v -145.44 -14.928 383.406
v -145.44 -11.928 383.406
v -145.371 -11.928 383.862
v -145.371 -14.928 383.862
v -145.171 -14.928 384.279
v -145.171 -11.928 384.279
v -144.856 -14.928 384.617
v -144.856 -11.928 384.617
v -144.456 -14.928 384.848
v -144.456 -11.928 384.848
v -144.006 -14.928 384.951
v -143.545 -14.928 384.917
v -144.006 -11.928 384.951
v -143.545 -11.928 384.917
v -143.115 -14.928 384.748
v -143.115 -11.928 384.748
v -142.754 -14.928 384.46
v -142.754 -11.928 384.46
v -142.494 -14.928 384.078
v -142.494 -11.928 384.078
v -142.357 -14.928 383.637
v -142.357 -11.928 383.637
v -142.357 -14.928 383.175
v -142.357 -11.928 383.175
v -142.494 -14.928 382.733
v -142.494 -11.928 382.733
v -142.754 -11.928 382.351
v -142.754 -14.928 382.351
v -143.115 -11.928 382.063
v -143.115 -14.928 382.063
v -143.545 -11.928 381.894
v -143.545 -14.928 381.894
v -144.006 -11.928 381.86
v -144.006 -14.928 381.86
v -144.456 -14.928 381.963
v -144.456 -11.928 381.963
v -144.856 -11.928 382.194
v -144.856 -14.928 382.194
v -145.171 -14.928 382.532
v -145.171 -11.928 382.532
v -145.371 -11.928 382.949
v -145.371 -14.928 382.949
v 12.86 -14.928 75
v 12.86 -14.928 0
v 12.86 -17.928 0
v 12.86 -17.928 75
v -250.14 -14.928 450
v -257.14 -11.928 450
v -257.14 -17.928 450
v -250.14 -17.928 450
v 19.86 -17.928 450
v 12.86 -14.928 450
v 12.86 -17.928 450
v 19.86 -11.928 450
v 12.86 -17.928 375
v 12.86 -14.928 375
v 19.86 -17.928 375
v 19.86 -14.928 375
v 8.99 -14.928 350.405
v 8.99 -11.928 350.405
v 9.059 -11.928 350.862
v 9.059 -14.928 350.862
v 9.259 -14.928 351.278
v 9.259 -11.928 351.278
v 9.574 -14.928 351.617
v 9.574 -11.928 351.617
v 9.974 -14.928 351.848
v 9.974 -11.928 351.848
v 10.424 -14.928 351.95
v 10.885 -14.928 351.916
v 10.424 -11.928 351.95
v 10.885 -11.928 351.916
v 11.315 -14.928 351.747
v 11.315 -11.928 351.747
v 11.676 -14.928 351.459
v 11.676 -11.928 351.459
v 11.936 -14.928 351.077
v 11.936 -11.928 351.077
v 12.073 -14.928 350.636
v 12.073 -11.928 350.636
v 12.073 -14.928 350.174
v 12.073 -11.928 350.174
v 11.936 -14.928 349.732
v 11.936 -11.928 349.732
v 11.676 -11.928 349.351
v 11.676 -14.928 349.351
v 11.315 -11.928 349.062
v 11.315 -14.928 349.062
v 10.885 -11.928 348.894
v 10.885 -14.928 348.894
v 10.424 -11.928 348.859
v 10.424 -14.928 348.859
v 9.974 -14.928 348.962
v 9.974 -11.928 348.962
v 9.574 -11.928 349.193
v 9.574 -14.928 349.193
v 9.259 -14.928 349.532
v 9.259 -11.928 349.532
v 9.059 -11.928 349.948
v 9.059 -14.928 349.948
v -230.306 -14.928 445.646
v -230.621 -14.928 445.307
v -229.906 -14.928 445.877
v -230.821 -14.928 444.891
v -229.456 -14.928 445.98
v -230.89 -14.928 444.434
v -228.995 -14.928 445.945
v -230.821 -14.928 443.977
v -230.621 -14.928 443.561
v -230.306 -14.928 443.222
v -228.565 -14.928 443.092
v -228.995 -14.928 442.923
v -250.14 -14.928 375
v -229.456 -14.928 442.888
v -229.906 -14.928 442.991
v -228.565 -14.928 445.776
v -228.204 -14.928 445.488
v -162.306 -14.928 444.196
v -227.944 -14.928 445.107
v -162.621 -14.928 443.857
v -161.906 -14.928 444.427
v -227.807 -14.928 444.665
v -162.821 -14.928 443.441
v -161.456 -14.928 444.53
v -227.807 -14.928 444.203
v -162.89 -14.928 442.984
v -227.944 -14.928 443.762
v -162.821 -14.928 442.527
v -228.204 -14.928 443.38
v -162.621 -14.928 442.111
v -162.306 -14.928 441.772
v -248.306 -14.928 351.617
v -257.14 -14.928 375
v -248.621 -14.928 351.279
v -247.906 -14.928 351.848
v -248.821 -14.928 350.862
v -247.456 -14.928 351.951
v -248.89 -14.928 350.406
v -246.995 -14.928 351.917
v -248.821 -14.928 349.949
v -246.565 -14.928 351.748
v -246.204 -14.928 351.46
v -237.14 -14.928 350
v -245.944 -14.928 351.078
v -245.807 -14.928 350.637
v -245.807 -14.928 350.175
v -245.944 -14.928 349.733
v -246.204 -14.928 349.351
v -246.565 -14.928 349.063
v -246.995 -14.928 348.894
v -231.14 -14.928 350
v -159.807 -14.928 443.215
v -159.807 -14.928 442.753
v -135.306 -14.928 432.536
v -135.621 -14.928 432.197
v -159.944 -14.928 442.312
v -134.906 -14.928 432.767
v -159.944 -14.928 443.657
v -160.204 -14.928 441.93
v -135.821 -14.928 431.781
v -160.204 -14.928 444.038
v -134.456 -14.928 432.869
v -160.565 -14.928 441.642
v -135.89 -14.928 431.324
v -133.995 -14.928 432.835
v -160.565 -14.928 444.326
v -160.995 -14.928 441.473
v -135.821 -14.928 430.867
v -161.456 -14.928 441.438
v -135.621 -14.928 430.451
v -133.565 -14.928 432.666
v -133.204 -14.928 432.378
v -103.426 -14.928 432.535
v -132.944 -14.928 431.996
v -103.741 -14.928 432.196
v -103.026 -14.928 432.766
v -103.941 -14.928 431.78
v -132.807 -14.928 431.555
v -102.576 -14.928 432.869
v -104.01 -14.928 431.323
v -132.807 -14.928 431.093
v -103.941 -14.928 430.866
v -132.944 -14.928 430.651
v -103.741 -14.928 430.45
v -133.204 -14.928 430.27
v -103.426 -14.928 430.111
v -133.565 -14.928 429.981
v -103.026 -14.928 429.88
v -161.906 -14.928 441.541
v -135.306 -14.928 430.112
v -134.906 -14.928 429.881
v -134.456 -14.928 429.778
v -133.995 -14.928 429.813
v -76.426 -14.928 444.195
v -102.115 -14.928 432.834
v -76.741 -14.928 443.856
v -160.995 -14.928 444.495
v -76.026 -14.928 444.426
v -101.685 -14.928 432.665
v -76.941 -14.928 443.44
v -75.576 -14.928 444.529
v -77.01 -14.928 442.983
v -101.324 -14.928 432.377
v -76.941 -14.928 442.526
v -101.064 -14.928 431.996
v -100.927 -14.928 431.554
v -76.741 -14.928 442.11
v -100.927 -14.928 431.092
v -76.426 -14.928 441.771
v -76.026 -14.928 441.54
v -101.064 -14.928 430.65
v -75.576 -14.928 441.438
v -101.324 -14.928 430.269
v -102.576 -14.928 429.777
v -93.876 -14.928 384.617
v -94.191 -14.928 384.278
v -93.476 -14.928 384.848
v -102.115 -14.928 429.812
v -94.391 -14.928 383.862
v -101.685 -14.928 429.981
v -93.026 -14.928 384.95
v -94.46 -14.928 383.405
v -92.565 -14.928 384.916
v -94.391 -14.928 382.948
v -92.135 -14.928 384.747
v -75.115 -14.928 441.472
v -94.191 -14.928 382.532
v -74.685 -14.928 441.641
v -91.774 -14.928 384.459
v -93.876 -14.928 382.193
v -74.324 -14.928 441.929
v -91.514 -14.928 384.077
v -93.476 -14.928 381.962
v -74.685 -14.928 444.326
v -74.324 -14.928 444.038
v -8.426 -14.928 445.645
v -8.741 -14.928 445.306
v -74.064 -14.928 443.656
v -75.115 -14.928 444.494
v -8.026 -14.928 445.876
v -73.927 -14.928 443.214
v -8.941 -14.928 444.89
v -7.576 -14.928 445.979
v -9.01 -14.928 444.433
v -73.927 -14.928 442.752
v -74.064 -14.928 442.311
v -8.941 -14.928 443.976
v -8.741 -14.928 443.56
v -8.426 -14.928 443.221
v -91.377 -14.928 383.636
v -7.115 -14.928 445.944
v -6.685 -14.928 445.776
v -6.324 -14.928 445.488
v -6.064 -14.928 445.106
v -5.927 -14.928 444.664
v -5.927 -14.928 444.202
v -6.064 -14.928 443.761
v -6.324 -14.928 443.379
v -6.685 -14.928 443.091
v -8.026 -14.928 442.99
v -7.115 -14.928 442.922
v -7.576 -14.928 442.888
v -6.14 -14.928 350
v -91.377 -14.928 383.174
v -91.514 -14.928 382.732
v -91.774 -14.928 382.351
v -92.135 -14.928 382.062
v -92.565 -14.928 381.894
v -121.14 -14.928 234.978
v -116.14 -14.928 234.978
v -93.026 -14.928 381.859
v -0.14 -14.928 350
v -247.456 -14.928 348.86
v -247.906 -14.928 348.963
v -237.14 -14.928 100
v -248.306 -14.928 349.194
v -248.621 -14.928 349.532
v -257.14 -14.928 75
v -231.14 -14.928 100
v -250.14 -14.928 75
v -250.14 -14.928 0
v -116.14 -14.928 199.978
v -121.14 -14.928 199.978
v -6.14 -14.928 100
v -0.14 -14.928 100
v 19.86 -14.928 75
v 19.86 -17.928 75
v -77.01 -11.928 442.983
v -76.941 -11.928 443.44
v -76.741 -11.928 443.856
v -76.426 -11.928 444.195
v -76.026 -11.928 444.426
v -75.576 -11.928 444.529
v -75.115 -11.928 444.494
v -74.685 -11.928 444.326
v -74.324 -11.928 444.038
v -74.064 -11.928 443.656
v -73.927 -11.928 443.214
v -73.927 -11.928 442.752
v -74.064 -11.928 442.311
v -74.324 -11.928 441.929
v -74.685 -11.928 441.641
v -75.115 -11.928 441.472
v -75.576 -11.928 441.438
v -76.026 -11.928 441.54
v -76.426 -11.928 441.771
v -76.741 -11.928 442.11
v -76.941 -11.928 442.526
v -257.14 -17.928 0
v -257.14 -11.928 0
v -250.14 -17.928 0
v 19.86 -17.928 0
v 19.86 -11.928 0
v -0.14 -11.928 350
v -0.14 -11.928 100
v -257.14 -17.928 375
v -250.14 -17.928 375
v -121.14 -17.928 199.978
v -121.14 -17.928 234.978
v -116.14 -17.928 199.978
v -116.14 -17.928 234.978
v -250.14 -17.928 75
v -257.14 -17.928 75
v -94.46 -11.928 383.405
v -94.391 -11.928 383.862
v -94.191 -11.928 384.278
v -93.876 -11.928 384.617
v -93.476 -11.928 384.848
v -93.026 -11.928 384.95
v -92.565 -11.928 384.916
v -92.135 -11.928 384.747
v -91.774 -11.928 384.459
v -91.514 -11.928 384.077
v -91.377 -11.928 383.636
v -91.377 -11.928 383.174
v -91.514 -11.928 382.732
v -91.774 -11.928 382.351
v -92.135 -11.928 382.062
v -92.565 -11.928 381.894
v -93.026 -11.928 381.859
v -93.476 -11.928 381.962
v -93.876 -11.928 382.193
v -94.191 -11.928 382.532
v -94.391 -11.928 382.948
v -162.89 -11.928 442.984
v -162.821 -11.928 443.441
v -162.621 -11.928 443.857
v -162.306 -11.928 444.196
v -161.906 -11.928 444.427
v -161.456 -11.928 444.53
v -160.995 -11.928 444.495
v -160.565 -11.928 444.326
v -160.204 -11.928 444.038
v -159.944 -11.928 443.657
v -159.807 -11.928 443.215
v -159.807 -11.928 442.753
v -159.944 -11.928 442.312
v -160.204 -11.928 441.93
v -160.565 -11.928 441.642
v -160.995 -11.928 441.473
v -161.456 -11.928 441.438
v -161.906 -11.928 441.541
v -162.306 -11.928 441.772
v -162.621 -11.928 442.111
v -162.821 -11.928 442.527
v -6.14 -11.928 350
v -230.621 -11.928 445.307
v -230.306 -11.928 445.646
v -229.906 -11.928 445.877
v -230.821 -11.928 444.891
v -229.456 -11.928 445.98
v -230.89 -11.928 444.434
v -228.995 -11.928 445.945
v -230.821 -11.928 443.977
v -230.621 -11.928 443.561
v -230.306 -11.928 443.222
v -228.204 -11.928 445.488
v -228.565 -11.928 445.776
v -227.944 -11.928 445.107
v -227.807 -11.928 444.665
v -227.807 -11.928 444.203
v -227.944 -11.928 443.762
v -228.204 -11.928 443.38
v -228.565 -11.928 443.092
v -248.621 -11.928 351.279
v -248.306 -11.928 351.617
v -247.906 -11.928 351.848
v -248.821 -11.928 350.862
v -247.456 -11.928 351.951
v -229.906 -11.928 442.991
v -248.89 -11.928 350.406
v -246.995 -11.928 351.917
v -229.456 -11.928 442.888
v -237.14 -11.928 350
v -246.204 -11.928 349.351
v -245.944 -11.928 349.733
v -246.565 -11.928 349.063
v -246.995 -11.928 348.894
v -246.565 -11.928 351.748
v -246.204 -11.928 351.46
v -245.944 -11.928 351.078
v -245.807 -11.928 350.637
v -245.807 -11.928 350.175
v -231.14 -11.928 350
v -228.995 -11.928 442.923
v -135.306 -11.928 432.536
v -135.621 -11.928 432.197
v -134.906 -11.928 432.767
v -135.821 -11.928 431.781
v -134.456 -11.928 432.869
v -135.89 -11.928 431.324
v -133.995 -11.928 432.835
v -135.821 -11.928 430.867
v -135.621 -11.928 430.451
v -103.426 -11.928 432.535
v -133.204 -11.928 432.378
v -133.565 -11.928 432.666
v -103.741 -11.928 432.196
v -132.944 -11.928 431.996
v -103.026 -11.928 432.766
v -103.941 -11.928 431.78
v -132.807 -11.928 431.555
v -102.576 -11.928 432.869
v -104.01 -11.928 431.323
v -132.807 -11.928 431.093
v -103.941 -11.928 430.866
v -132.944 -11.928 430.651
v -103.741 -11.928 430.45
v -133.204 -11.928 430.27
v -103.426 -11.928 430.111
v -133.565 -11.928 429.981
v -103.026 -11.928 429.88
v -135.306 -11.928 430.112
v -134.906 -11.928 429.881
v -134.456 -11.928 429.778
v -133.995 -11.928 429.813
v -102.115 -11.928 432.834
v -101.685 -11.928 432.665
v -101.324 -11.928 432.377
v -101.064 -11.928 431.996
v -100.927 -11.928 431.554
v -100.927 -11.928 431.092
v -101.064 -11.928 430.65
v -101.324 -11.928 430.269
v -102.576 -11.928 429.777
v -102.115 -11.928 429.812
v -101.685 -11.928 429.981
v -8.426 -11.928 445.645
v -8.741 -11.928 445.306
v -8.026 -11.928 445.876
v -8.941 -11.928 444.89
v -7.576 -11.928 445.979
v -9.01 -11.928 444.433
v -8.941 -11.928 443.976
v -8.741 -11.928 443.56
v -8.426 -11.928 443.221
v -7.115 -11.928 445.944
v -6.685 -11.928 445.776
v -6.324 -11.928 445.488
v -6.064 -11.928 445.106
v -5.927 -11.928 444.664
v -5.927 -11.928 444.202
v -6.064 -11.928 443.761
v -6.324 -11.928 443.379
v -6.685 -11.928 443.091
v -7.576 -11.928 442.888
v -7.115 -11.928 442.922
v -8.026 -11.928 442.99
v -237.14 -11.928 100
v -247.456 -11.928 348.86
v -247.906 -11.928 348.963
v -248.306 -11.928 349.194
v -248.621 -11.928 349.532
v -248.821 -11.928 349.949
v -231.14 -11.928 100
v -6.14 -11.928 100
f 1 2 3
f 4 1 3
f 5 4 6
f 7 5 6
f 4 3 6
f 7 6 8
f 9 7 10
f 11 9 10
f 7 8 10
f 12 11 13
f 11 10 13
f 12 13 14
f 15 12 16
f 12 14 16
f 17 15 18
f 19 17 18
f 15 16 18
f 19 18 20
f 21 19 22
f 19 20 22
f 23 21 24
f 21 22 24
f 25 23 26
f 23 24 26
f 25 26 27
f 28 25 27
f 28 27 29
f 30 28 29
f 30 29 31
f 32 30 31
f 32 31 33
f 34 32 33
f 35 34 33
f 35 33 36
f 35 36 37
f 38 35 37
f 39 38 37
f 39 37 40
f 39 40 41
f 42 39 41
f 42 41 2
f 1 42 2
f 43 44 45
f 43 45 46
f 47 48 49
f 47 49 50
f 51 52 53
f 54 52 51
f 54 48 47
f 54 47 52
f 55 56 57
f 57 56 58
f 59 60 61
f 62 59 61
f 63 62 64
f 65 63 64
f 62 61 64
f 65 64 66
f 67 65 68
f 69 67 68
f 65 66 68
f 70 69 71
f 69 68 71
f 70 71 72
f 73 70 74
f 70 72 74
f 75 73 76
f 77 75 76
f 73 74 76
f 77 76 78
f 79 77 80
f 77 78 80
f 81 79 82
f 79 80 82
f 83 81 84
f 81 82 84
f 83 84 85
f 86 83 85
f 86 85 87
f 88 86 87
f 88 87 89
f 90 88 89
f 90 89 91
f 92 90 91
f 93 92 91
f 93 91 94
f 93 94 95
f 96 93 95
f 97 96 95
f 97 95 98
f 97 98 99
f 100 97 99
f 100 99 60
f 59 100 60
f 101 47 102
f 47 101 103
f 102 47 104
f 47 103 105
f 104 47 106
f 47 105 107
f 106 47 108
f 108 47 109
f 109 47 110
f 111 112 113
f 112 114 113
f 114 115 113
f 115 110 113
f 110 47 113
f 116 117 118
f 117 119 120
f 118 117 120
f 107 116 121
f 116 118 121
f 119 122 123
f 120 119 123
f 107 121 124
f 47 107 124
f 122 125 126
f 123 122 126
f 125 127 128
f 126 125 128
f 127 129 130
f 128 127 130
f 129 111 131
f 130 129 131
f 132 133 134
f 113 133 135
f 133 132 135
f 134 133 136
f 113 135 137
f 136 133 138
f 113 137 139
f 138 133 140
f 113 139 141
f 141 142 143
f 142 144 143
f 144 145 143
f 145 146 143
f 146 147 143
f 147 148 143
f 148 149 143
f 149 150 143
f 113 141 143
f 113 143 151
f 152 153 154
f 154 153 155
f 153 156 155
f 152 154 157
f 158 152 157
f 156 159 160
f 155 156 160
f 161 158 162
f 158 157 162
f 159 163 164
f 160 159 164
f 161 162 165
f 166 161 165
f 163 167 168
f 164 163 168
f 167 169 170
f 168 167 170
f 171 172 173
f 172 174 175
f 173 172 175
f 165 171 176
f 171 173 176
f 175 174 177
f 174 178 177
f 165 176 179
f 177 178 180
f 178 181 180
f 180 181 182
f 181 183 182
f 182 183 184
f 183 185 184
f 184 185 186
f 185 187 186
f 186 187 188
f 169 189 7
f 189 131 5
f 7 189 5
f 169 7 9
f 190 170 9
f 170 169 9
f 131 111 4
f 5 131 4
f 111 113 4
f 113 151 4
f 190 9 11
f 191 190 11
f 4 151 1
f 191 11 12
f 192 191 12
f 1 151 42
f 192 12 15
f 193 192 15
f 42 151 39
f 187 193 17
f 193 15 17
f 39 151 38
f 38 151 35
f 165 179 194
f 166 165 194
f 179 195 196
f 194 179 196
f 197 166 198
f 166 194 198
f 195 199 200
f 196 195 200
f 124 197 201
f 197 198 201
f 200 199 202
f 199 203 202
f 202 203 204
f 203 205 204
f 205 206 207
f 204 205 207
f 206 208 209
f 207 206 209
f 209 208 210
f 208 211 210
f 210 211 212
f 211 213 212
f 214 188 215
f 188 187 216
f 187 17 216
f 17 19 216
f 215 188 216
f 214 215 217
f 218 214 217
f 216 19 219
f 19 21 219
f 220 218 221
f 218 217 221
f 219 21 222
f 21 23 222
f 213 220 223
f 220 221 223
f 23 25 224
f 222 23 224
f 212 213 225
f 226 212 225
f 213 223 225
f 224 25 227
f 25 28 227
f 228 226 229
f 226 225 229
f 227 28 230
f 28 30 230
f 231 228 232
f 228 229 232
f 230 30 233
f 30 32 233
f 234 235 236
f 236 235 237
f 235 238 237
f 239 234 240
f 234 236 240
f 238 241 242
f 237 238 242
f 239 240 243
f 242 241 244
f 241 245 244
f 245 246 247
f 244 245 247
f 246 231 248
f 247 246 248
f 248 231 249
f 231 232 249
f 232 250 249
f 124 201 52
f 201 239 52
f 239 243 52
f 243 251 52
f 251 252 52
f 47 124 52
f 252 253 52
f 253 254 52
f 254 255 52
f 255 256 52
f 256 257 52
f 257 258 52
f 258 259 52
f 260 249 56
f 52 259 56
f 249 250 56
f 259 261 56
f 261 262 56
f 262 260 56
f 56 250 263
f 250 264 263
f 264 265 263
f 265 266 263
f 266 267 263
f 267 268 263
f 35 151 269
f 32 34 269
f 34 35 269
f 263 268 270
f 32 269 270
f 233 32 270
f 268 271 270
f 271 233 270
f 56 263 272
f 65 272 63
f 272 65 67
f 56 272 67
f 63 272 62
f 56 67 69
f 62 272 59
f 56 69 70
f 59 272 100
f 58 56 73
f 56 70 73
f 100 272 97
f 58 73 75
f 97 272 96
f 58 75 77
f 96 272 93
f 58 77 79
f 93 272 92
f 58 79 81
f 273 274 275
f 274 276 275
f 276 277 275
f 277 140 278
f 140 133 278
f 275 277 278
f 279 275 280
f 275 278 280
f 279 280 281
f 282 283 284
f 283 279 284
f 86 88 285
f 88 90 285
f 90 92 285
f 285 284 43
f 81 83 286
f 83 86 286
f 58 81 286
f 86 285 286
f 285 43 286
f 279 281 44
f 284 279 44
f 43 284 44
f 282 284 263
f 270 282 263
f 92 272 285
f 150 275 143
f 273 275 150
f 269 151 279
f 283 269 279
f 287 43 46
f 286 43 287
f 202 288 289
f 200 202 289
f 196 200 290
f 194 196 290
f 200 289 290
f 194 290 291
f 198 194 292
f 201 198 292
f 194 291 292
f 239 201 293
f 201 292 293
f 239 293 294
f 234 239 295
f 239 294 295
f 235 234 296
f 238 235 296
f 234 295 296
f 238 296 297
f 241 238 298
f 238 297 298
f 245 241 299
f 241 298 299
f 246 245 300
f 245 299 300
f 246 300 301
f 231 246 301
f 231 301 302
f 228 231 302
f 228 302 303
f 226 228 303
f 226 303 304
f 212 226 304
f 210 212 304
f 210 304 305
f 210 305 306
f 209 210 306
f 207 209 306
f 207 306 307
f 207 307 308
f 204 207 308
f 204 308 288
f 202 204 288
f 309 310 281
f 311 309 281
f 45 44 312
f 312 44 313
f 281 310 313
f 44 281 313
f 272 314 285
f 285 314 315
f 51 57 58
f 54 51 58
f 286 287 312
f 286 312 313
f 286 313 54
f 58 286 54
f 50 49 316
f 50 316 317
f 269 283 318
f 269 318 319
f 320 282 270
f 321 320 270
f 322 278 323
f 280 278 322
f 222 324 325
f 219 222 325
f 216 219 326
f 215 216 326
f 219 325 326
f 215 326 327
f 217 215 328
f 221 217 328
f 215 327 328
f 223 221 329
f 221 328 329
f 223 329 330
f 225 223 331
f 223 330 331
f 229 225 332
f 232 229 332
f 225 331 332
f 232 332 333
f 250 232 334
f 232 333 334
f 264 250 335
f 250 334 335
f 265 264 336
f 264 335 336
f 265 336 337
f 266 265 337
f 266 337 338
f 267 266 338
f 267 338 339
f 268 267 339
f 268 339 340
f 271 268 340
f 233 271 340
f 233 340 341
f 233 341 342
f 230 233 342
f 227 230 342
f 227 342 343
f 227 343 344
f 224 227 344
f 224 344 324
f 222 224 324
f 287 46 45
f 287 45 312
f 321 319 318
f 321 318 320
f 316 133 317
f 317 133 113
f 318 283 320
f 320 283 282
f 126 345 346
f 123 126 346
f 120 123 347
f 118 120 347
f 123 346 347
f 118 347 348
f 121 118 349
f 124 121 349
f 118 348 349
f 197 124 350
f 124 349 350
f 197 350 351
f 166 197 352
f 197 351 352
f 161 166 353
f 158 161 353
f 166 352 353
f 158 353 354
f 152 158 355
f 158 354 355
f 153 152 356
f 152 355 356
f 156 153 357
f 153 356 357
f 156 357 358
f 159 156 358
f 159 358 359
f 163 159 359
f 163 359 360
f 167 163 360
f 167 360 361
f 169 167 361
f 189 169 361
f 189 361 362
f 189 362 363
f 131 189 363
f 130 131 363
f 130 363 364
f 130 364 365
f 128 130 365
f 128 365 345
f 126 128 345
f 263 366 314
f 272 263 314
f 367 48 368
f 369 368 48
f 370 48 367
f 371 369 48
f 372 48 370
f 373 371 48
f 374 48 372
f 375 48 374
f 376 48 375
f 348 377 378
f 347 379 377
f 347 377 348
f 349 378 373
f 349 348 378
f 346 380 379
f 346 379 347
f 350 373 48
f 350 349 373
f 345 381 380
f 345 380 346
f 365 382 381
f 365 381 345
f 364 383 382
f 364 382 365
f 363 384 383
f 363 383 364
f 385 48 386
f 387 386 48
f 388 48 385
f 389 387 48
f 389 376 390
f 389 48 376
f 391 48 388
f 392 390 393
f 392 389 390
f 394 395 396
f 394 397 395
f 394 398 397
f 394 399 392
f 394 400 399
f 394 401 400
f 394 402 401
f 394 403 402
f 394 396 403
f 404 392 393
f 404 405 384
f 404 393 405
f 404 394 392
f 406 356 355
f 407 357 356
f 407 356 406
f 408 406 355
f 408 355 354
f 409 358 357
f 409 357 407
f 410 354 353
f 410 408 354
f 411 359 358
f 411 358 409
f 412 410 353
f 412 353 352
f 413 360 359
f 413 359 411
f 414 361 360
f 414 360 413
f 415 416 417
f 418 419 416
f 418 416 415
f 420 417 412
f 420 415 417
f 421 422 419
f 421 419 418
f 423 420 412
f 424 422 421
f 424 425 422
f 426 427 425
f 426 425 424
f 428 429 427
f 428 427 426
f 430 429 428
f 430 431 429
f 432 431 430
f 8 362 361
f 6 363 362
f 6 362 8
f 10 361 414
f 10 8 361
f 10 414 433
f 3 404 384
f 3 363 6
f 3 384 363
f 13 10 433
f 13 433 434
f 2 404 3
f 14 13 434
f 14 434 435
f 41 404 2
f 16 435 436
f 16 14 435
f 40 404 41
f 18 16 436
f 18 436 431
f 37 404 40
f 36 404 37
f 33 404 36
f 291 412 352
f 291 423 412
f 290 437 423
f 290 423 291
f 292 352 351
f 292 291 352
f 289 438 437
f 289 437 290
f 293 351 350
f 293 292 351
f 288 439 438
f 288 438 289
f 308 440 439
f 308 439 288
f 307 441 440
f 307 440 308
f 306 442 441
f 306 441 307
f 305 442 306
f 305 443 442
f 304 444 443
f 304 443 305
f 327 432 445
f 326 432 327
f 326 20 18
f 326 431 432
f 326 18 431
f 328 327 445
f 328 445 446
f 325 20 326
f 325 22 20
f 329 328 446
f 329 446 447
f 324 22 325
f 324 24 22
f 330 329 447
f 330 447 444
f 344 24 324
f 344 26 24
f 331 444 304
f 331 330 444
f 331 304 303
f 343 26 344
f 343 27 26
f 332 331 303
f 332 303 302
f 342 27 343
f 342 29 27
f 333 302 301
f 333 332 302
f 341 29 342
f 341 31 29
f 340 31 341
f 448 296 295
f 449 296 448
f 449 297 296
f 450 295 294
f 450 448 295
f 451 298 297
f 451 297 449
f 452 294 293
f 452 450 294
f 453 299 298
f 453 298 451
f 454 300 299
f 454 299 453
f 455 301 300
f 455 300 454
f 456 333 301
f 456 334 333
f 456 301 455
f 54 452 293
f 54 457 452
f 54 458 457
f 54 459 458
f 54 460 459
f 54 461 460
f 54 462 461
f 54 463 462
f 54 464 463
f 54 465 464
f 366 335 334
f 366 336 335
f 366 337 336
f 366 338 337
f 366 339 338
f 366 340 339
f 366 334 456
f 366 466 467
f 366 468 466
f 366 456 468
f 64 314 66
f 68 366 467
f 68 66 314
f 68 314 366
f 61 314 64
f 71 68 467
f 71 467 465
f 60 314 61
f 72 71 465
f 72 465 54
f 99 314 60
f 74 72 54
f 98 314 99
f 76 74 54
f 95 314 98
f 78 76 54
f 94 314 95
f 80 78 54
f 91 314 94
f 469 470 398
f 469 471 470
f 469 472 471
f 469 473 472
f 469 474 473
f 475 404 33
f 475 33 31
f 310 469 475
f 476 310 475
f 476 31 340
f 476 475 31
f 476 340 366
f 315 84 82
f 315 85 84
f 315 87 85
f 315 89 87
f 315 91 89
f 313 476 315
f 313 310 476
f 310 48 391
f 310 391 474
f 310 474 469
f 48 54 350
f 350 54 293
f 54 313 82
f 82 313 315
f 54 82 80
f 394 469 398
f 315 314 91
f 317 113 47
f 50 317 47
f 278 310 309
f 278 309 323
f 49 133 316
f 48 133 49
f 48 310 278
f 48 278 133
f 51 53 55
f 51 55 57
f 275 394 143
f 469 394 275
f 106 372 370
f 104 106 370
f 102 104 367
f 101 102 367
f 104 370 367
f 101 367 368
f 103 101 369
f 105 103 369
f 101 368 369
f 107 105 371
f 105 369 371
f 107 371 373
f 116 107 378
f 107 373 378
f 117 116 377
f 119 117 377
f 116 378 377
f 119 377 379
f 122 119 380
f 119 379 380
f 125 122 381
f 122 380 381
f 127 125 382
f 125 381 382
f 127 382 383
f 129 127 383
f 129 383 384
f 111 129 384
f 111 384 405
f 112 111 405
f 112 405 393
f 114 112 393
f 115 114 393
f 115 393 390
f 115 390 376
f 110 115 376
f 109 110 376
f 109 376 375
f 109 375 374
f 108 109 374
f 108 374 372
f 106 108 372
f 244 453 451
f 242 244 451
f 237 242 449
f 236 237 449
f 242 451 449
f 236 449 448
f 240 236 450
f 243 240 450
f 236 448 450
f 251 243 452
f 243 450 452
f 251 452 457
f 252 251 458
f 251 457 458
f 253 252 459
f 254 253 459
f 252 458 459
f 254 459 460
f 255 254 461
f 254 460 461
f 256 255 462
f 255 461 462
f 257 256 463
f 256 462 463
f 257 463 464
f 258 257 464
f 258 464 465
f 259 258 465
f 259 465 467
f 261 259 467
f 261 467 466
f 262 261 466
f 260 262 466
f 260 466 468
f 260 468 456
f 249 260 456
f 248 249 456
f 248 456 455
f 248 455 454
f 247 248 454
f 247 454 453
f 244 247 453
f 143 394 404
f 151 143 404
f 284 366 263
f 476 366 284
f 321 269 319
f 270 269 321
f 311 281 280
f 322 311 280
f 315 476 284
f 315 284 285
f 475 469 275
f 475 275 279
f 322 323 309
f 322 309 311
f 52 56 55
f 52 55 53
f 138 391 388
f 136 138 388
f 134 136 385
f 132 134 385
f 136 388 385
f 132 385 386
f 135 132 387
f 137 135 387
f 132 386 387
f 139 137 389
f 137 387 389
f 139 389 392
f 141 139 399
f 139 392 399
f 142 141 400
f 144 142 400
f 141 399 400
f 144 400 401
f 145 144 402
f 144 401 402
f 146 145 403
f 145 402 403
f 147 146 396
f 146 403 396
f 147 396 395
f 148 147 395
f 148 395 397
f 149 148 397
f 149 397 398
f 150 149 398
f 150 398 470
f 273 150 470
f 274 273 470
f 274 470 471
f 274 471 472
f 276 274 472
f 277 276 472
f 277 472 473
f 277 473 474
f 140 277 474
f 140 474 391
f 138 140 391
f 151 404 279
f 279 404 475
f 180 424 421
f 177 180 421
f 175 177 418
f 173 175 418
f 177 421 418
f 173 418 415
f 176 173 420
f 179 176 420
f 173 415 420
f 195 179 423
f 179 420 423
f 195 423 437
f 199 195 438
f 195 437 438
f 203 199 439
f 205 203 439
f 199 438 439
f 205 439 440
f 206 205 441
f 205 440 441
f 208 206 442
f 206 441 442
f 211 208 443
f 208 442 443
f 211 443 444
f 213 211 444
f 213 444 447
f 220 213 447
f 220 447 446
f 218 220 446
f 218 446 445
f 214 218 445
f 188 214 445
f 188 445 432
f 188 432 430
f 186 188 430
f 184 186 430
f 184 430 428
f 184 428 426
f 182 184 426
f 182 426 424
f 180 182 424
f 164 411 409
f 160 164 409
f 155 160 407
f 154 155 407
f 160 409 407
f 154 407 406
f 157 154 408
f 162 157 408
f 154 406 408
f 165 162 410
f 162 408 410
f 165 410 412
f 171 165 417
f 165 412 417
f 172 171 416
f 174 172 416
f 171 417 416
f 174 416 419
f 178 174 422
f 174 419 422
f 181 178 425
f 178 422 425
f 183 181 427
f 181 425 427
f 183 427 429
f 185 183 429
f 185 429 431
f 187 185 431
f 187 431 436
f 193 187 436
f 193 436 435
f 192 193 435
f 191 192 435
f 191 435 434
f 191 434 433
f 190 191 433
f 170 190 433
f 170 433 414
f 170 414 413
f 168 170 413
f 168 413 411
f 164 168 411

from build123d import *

# Parameters (mm, degrees)
SKETCH1_W           = 277
SKETCH1_H           = 3
BOSS_EXTRUDE1_DEPTH = 450
CUT_EXTRUDE1_REACH  = 520.295
SKETCH2_W           = 6
SKETCH2_H           = 250
CUT_EXTRUDE2_REACH  = 520.295
SKETCH3_R           = 1.55
SKETCH4_W           = 7
SKETCH4_H           = 75
SKETCH4_W_2         = 5
SKETCH4_H_2         = 35
BOSS_EXTRUDE2_DEPTH = 3


with BuildPart() as part:
    # Sketch1 → Boss-Extrude1 (new body)
    with BuildSketch(Plane.XY):
        with Locations((-118.640040599, -13.427850278)):
            Rectangle(SKETCH1_W, SKETCH1_H)
    extrude(amount=BOSS_EXTRUDE1_DEPTH)

    # Sketch2 → Cut-Extrude1 (cut, up to next)
    with BuildSketch(Plane(origin=(0, -11.927850278, 0), x_dir=(1, 0, 0), z_dir=(0, 1, 0)), mode=Mode.PRIVATE) as cut_extrude1_sk1:
        with Locations((-234.140040599, -225)):
            Rectangle(SKETCH2_W, SKETCH2_H)
    cut_extrude1_tool1 = extrude(cut_extrude1_sk1.sketch, amount=-CUT_EXTRUDE1_REACH, mode=Mode.PRIVATE) & part.part
    # Sketch2 → Cut-Extrude1 (cut, up to next)
    with BuildSketch(Plane(origin=(0, -11.927850278, 0), x_dir=(1, 0, 0), z_dir=(0, 1, 0)), mode=Mode.PRIVATE) as cut_extrude1_sk2:
        with Locations((-3.140040599, -225)):
            Rectangle(SKETCH2_W, SKETCH2_H)
    cut_extrude1_tool2 = extrude(cut_extrude1_sk2.sketch, amount=-CUT_EXTRUDE1_REACH, mode=Mode.PRIVATE) & part.part
    add(cut_extrude1_tool1.solids().sort_by_distance((-234.140041, -11.92785, 225))[0], mode=Mode.SUBTRACT)
    add(cut_extrude1_tool2.solids().sort_by_distance((-3.140041, -11.92785, 225))[0], mode=Mode.SUBTRACT)

    # Sketch3 → Cut-Extrude2 (cut, up to next)
    with BuildSketch(Plane(origin=(0, -11.927850278, 0), x_dir=(1, 0, 0), z_dir=(0, 1, 0)), mode=Mode.PRIVATE) as cut_extrude2_sk1:
        with Locations(Location((-102.460040599, -431.322984009, 0), (0, 0, 180))):
            Circle(SKETCH3_R)
    cut_extrude2_tool1 = extrude(cut_extrude2_sk1.sketch, amount=-CUT_EXTRUDE2_REACH, mode=Mode.PRIVATE) & part.part
    # Sketch3 → Cut-Extrude2 (cut, up to next)
    with BuildSketch(Plane(origin=(0, -11.927850278, 0), x_dir=(1, 0, 0), z_dir=(0, 1, 0)), mode=Mode.PRIVATE) as cut_extrude2_sk2:
        with Locations(Location((-75.460040599, -442.983238046, 0), (0, 0, 180))):
            Circle(SKETCH3_R)
    cut_extrude2_tool2 = extrude(cut_extrude2_sk2.sketch, amount=-CUT_EXTRUDE2_REACH, mode=Mode.PRIVATE) & part.part
    # Sketch3 → Cut-Extrude2 (cut, up to next)
    with BuildSketch(Plane(origin=(0, -11.927850278, 0), x_dir=(1, 0, 0), z_dir=(0, 1, 0)), mode=Mode.PRIVATE) as cut_extrude2_sk3:
        with Locations(Location((-92.910040599, -383.404829271, 0), (0, 0, 180))):
            Circle(SKETCH3_R)
    cut_extrude2_tool3 = extrude(cut_extrude2_sk3.sketch, amount=-CUT_EXTRUDE2_REACH, mode=Mode.PRIVATE) & part.part
    # Sketch3 → Cut-Extrude2 (cut, up to next)
    with BuildSketch(Plane(origin=(0, -11.927850278, 0), x_dir=(1, 0, 0), z_dir=(0, 1, 0)), mode=Mode.PRIVATE) as cut_extrude2_sk4:
        with Locations(Location((10.539959401, -350.404829271, 0), (0, 0, 180))):
            Circle(SKETCH3_R)
    cut_extrude2_tool4 = extrude(cut_extrude2_sk4.sketch, amount=-CUT_EXTRUDE2_REACH, mode=Mode.PRIVATE) & part.part
    # Sketch3 → Cut-Extrude2 (cut, up to next)
    with BuildSketch(Plane(origin=(0, -11.927850278, 0), x_dir=(1, 0, 0), z_dir=(0, 1, 0)), mode=Mode.PRIVATE) as cut_extrude2_sk5:
        with Locations(Location((-7.460040599, -444.433238046, 0), (0, 0, 180))):
            Circle(SKETCH3_R)
    cut_extrude2_tool5 = extrude(cut_extrude2_sk5.sketch, amount=-CUT_EXTRUDE2_REACH, mode=Mode.PRIVATE) & part.part
    # Sketch3 → Cut-Extrude2 (cut, up to next)
    with BuildSketch(Plane(origin=(0, -11.927850278, 0), x_dir=(1, 0, 0), z_dir=(0, 1, 0)), mode=Mode.PRIVATE) as cut_extrude2_sk6:
        with Locations(Location((-247.340040599, -350.40562763, 0), (0, 0, 180))):
            Circle(SKETCH3_R)
    cut_extrude2_tool6 = extrude(cut_extrude2_sk6.sketch, amount=-CUT_EXTRUDE2_REACH, mode=Mode.PRIVATE) & part.part
    # Sketch3 → Cut-Extrude2 (cut, up to next)
    with BuildSketch(Plane(origin=(0, -11.927850278, 0), x_dir=(1, 0, 0), z_dir=(0, 1, 0)), mode=Mode.PRIVATE) as cut_extrude2_sk7:
        with Locations(Location((-229.340040599, -444.434036405, 0), (0, 0, 180))):
            Circle(SKETCH3_R)
    cut_extrude2_tool7 = extrude(cut_extrude2_sk7.sketch, amount=-CUT_EXTRUDE2_REACH, mode=Mode.PRIVATE) & part.part
    # Sketch3 → Cut-Extrude2 (cut, up to next)
    with BuildSketch(Plane(origin=(0, -11.927850278, 0), x_dir=(1, 0, 0), z_dir=(0, 1, 0)), mode=Mode.PRIVATE) as cut_extrude2_sk8:
        with Locations(Location((-161.340040599, -442.984036405, 0), (0, 0, 180))):
            Circle(SKETCH3_R)
    cut_extrude2_tool8 = extrude(cut_extrude2_sk8.sketch, amount=-CUT_EXTRUDE2_REACH, mode=Mode.PRIVATE) & part.part
    # Sketch3 → Cut-Extrude2 (cut, up to next)
    with BuildSketch(Plane(origin=(0, -11.927850278, 0), x_dir=(1, 0, 0), z_dir=(0, 1, 0)), mode=Mode.PRIVATE) as cut_extrude2_sk9:
        with Locations(Location((-134.340040599, -431.323782367, 0), (0, 0, 180))):
            Circle(SKETCH3_R)
    cut_extrude2_tool9 = extrude(cut_extrude2_sk9.sketch, amount=-CUT_EXTRUDE2_REACH, mode=Mode.PRIVATE) & part.part
    # Sketch3 → Cut-Extrude2 (cut, up to next)
    with BuildSketch(Plane(origin=(0, -11.927850278, 0), x_dir=(1, 0, 0), z_dir=(0, 1, 0)), mode=Mode.PRIVATE) as cut_extrude2_sk10:
        with Locations(Location((-143.890040599, -383.40562763, 0), (0, 0, 180))):
            Circle(SKETCH3_R)
    cut_extrude2_tool10 = extrude(cut_extrude2_sk10.sketch, amount=-CUT_EXTRUDE2_REACH, mode=Mode.PRIVATE) & part.part
    add(cut_extrude2_tool1.solids().sort_by_distance((-102.460041, -11.92785, 431.322984))[0], mode=Mode.SUBTRACT)
    add(cut_extrude2_tool2.solids().sort_by_distance((-75.460041, -11.92785, 442.983238))[0], mode=Mode.SUBTRACT)
    add(cut_extrude2_tool3.solids().sort_by_distance((-92.910041, -11.92785, 383.404829))[0], mode=Mode.SUBTRACT)
    add(cut_extrude2_tool4.solids().sort_by_distance((10.539959, -11.92785, 350.404829))[0], mode=Mode.SUBTRACT)
    add(cut_extrude2_tool5.solids().sort_by_distance((-7.460041, -11.92785, 444.433238))[0], mode=Mode.SUBTRACT)
    add(cut_extrude2_tool6.solids().sort_by_distance((-247.340041, -11.92785, 350.405628))[0], mode=Mode.SUBTRACT)
    add(cut_extrude2_tool7.solids().sort_by_distance((-229.340041, -11.92785, 444.434036))[0], mode=Mode.SUBTRACT)
    add(cut_extrude2_tool8.solids().sort_by_distance((-161.340041, -11.92785, 442.984036))[0], mode=Mode.SUBTRACT)
    add(cut_extrude2_tool9.solids().sort_by_distance((-134.340041, -11.92785, 431.323782))[0], mode=Mode.SUBTRACT)
    add(cut_extrude2_tool10.solids().sort_by_distance((-143.890041, -11.92785, 383.405628))[0], mode=Mode.SUBTRACT)

    # Sketch4 → Boss-Extrude2 (add)
    with BuildSketch(Plane.XZ.offset(14.927850278)):
        with Locations((-253.640040599, 412.5)):
            Rectangle(SKETCH4_W, SKETCH4_H)
        with Locations((16.359959401, 412.5)):
            Rectangle(SKETCH4_W, SKETCH4_H)
        with Locations((-253.640040599, 37.5)):
            Rectangle(SKETCH4_W, SKETCH4_H)
        with Locations((16.359959401, 37.5)):
            Rectangle(SKETCH4_W, SKETCH4_H)
        with Locations((-118.640040599, 217.477852068)):
            Rectangle(SKETCH4_W_2, SKETCH4_H_2)
    extrude(amount=BOSS_EXTRUDE2_DEPTH)


solid = part.part
